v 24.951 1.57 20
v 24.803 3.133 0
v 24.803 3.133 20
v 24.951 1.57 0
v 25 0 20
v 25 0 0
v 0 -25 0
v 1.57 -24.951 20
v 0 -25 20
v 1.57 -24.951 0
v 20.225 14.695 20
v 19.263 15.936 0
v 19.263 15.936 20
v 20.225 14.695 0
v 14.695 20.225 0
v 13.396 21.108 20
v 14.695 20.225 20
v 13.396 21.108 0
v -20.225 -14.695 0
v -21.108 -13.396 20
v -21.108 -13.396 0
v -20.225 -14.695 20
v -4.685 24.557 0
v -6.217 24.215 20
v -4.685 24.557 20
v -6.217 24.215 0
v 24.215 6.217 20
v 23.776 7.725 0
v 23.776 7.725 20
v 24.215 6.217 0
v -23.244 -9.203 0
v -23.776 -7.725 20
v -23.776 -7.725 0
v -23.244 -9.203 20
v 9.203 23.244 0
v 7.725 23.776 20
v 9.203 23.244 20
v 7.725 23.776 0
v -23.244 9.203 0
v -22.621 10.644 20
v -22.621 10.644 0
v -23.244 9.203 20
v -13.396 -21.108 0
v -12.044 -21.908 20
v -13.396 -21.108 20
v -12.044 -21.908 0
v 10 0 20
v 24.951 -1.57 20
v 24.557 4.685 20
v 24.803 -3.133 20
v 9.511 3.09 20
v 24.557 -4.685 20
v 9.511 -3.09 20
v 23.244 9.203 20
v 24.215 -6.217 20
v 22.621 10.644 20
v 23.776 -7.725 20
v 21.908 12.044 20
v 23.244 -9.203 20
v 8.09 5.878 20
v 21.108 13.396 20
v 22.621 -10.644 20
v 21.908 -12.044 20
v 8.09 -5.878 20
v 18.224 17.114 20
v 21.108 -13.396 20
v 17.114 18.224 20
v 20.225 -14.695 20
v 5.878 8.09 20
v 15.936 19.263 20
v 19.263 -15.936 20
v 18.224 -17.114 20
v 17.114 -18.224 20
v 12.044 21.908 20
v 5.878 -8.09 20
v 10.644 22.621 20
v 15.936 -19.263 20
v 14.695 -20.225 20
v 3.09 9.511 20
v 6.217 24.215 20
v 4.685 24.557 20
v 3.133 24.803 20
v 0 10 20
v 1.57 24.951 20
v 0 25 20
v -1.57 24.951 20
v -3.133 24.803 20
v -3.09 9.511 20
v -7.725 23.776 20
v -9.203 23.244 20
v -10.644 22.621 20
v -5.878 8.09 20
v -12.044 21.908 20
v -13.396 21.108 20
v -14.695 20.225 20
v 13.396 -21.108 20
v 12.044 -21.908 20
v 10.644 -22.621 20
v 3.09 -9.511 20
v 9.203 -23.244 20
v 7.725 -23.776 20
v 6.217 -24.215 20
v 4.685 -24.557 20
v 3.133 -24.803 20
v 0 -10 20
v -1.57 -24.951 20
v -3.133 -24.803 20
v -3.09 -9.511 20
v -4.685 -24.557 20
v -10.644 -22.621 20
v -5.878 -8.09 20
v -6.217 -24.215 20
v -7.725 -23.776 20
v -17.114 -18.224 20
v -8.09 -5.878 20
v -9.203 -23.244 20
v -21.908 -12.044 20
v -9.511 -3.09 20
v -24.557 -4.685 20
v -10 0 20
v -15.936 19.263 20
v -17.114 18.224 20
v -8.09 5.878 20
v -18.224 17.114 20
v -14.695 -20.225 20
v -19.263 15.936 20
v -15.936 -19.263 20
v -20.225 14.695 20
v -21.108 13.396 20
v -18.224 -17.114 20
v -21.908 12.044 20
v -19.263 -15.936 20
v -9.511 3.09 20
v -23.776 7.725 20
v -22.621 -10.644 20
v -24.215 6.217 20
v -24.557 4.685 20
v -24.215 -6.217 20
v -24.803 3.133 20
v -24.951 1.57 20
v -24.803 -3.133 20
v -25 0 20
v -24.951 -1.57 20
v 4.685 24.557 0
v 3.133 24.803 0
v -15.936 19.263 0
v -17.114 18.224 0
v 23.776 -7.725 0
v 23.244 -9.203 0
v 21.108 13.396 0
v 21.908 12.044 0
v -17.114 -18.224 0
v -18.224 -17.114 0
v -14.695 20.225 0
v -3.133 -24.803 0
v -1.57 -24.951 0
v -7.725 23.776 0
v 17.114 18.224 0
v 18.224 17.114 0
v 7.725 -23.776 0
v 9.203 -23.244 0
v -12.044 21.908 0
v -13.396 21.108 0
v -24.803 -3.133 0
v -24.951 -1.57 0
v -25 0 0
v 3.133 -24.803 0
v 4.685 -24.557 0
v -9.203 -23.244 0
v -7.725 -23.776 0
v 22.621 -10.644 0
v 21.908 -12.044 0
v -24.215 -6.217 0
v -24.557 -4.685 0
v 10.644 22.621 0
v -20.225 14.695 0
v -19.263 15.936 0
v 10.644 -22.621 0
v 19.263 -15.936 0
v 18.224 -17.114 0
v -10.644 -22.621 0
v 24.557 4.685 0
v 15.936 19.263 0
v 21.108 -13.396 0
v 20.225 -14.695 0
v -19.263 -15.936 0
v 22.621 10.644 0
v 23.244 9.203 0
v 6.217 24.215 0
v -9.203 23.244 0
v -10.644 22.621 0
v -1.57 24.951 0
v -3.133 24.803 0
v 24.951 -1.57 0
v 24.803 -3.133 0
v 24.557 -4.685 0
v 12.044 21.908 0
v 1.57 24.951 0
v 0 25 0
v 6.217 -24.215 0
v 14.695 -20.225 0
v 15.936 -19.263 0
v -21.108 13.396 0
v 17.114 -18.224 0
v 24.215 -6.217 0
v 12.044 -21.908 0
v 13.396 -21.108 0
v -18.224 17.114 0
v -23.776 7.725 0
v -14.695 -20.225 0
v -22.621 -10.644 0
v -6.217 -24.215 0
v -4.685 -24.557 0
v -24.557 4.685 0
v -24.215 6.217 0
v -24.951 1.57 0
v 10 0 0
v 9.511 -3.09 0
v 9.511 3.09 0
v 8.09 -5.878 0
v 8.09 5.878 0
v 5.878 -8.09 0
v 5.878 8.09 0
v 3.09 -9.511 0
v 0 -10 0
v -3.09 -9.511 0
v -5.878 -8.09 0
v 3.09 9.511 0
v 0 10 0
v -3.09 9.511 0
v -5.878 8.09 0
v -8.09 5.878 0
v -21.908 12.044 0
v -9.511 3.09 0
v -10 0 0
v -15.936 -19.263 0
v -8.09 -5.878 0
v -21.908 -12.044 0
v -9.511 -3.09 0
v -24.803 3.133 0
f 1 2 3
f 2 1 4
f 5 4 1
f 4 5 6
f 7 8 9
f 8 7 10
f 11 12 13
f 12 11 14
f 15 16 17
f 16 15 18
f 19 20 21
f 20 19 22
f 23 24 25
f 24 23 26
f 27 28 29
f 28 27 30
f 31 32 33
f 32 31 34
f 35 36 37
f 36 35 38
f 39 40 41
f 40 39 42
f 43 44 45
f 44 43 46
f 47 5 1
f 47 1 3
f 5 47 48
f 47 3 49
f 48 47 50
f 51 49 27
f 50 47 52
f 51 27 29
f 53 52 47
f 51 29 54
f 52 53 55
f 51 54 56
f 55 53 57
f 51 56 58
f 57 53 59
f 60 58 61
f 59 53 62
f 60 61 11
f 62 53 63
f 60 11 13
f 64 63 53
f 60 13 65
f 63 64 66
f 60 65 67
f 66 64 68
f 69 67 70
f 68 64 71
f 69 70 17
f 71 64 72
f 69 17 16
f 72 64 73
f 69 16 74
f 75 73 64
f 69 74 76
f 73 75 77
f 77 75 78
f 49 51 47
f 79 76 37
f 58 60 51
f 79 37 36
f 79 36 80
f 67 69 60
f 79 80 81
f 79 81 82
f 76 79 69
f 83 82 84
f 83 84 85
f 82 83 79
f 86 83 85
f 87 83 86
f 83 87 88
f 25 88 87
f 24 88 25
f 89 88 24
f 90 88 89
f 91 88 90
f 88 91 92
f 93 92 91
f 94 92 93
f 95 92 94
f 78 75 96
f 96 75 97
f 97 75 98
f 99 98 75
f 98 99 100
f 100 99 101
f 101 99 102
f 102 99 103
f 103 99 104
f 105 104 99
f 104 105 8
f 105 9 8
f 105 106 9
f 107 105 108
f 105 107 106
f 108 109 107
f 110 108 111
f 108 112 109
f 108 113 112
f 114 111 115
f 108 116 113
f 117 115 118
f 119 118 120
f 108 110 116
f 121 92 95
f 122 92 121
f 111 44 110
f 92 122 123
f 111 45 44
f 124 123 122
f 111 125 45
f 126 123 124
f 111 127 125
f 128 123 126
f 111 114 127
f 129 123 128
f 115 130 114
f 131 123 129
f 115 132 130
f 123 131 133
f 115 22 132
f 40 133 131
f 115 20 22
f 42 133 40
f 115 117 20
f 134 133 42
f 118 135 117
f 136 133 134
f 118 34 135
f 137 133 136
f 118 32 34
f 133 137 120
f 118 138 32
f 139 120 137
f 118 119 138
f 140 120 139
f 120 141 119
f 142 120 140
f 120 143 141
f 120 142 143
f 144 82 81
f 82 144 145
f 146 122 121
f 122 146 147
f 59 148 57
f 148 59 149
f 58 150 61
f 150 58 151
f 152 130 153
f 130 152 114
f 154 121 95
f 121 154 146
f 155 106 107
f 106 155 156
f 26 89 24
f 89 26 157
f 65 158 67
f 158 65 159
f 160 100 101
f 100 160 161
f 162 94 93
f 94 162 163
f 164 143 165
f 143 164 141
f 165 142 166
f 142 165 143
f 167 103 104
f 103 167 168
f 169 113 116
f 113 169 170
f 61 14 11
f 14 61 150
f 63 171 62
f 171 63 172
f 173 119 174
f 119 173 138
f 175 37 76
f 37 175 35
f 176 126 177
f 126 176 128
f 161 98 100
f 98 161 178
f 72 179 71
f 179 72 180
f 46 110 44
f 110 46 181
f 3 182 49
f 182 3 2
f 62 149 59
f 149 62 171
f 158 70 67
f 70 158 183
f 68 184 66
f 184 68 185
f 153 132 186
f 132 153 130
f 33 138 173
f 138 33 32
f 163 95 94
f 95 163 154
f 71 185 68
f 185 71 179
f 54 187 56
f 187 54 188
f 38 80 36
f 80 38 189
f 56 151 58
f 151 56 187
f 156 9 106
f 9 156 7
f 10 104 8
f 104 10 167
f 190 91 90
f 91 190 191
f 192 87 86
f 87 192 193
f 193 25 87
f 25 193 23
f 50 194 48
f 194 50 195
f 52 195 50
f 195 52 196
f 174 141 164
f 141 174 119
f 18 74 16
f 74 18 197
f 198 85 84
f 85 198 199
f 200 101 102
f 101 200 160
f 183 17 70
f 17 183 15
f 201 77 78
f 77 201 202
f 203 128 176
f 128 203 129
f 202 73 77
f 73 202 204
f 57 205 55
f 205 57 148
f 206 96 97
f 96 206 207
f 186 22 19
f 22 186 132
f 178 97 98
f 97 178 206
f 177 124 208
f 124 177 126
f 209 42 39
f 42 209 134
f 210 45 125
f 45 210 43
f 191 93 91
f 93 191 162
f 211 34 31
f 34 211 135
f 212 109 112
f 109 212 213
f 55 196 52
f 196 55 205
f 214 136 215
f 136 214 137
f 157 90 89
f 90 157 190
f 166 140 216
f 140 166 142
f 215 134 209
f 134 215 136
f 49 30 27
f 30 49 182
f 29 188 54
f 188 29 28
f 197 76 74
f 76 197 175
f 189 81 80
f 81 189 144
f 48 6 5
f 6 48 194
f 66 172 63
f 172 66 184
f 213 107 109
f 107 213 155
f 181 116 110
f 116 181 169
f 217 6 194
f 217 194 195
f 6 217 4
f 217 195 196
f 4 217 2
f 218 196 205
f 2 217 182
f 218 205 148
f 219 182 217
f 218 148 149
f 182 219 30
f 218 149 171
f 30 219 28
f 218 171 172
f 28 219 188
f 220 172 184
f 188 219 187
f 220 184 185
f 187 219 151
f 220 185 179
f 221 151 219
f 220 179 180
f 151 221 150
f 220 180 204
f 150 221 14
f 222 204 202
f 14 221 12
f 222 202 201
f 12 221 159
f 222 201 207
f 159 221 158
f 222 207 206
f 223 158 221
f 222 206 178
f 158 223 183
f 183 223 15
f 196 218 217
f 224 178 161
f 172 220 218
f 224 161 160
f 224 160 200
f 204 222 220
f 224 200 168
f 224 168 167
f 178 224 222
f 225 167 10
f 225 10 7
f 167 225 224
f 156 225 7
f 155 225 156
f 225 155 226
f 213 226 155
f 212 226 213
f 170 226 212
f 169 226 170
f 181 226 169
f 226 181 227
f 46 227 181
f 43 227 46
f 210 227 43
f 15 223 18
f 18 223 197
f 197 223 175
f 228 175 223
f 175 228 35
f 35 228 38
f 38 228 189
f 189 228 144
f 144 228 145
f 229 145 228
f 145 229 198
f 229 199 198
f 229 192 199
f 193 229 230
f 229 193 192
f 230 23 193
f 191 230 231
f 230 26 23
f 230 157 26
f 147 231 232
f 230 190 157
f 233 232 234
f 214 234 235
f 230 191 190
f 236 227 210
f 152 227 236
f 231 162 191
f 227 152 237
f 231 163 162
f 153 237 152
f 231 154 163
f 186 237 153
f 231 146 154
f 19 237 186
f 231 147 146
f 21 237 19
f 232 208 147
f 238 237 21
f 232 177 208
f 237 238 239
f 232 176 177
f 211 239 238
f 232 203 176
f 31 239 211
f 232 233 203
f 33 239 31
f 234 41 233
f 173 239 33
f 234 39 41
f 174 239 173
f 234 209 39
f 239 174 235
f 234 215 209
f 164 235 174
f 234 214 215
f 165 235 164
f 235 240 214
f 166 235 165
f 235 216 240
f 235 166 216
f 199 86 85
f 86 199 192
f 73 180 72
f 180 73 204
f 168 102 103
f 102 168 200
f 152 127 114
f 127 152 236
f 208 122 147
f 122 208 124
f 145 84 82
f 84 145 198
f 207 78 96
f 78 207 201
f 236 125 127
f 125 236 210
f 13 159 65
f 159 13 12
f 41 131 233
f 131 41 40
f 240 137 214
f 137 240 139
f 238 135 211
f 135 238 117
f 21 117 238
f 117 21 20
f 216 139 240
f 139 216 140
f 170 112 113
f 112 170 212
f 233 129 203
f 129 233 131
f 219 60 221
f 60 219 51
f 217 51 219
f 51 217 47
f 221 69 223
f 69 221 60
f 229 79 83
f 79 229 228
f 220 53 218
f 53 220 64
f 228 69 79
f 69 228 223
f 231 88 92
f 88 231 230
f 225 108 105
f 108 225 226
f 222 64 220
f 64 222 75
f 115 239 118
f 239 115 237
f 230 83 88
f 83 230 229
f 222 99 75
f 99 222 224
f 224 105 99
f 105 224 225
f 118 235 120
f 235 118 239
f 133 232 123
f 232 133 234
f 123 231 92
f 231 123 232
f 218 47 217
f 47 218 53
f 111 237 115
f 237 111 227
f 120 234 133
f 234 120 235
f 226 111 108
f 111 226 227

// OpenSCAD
//-- Parametros de la rueda
grosor = 20;
diametro=50;
diam_eje=20;

//-- Construcción rueda simple a partir de parametros
difference(){
    //-- Base de la rueda
    cylinder(r=diametro/2, h=grosor, $fn=100);
    
    //--Taladro de 8mm
    cylinder(r=diam_eje/2, h=3*grosor, $fn=20, center=true);
}
